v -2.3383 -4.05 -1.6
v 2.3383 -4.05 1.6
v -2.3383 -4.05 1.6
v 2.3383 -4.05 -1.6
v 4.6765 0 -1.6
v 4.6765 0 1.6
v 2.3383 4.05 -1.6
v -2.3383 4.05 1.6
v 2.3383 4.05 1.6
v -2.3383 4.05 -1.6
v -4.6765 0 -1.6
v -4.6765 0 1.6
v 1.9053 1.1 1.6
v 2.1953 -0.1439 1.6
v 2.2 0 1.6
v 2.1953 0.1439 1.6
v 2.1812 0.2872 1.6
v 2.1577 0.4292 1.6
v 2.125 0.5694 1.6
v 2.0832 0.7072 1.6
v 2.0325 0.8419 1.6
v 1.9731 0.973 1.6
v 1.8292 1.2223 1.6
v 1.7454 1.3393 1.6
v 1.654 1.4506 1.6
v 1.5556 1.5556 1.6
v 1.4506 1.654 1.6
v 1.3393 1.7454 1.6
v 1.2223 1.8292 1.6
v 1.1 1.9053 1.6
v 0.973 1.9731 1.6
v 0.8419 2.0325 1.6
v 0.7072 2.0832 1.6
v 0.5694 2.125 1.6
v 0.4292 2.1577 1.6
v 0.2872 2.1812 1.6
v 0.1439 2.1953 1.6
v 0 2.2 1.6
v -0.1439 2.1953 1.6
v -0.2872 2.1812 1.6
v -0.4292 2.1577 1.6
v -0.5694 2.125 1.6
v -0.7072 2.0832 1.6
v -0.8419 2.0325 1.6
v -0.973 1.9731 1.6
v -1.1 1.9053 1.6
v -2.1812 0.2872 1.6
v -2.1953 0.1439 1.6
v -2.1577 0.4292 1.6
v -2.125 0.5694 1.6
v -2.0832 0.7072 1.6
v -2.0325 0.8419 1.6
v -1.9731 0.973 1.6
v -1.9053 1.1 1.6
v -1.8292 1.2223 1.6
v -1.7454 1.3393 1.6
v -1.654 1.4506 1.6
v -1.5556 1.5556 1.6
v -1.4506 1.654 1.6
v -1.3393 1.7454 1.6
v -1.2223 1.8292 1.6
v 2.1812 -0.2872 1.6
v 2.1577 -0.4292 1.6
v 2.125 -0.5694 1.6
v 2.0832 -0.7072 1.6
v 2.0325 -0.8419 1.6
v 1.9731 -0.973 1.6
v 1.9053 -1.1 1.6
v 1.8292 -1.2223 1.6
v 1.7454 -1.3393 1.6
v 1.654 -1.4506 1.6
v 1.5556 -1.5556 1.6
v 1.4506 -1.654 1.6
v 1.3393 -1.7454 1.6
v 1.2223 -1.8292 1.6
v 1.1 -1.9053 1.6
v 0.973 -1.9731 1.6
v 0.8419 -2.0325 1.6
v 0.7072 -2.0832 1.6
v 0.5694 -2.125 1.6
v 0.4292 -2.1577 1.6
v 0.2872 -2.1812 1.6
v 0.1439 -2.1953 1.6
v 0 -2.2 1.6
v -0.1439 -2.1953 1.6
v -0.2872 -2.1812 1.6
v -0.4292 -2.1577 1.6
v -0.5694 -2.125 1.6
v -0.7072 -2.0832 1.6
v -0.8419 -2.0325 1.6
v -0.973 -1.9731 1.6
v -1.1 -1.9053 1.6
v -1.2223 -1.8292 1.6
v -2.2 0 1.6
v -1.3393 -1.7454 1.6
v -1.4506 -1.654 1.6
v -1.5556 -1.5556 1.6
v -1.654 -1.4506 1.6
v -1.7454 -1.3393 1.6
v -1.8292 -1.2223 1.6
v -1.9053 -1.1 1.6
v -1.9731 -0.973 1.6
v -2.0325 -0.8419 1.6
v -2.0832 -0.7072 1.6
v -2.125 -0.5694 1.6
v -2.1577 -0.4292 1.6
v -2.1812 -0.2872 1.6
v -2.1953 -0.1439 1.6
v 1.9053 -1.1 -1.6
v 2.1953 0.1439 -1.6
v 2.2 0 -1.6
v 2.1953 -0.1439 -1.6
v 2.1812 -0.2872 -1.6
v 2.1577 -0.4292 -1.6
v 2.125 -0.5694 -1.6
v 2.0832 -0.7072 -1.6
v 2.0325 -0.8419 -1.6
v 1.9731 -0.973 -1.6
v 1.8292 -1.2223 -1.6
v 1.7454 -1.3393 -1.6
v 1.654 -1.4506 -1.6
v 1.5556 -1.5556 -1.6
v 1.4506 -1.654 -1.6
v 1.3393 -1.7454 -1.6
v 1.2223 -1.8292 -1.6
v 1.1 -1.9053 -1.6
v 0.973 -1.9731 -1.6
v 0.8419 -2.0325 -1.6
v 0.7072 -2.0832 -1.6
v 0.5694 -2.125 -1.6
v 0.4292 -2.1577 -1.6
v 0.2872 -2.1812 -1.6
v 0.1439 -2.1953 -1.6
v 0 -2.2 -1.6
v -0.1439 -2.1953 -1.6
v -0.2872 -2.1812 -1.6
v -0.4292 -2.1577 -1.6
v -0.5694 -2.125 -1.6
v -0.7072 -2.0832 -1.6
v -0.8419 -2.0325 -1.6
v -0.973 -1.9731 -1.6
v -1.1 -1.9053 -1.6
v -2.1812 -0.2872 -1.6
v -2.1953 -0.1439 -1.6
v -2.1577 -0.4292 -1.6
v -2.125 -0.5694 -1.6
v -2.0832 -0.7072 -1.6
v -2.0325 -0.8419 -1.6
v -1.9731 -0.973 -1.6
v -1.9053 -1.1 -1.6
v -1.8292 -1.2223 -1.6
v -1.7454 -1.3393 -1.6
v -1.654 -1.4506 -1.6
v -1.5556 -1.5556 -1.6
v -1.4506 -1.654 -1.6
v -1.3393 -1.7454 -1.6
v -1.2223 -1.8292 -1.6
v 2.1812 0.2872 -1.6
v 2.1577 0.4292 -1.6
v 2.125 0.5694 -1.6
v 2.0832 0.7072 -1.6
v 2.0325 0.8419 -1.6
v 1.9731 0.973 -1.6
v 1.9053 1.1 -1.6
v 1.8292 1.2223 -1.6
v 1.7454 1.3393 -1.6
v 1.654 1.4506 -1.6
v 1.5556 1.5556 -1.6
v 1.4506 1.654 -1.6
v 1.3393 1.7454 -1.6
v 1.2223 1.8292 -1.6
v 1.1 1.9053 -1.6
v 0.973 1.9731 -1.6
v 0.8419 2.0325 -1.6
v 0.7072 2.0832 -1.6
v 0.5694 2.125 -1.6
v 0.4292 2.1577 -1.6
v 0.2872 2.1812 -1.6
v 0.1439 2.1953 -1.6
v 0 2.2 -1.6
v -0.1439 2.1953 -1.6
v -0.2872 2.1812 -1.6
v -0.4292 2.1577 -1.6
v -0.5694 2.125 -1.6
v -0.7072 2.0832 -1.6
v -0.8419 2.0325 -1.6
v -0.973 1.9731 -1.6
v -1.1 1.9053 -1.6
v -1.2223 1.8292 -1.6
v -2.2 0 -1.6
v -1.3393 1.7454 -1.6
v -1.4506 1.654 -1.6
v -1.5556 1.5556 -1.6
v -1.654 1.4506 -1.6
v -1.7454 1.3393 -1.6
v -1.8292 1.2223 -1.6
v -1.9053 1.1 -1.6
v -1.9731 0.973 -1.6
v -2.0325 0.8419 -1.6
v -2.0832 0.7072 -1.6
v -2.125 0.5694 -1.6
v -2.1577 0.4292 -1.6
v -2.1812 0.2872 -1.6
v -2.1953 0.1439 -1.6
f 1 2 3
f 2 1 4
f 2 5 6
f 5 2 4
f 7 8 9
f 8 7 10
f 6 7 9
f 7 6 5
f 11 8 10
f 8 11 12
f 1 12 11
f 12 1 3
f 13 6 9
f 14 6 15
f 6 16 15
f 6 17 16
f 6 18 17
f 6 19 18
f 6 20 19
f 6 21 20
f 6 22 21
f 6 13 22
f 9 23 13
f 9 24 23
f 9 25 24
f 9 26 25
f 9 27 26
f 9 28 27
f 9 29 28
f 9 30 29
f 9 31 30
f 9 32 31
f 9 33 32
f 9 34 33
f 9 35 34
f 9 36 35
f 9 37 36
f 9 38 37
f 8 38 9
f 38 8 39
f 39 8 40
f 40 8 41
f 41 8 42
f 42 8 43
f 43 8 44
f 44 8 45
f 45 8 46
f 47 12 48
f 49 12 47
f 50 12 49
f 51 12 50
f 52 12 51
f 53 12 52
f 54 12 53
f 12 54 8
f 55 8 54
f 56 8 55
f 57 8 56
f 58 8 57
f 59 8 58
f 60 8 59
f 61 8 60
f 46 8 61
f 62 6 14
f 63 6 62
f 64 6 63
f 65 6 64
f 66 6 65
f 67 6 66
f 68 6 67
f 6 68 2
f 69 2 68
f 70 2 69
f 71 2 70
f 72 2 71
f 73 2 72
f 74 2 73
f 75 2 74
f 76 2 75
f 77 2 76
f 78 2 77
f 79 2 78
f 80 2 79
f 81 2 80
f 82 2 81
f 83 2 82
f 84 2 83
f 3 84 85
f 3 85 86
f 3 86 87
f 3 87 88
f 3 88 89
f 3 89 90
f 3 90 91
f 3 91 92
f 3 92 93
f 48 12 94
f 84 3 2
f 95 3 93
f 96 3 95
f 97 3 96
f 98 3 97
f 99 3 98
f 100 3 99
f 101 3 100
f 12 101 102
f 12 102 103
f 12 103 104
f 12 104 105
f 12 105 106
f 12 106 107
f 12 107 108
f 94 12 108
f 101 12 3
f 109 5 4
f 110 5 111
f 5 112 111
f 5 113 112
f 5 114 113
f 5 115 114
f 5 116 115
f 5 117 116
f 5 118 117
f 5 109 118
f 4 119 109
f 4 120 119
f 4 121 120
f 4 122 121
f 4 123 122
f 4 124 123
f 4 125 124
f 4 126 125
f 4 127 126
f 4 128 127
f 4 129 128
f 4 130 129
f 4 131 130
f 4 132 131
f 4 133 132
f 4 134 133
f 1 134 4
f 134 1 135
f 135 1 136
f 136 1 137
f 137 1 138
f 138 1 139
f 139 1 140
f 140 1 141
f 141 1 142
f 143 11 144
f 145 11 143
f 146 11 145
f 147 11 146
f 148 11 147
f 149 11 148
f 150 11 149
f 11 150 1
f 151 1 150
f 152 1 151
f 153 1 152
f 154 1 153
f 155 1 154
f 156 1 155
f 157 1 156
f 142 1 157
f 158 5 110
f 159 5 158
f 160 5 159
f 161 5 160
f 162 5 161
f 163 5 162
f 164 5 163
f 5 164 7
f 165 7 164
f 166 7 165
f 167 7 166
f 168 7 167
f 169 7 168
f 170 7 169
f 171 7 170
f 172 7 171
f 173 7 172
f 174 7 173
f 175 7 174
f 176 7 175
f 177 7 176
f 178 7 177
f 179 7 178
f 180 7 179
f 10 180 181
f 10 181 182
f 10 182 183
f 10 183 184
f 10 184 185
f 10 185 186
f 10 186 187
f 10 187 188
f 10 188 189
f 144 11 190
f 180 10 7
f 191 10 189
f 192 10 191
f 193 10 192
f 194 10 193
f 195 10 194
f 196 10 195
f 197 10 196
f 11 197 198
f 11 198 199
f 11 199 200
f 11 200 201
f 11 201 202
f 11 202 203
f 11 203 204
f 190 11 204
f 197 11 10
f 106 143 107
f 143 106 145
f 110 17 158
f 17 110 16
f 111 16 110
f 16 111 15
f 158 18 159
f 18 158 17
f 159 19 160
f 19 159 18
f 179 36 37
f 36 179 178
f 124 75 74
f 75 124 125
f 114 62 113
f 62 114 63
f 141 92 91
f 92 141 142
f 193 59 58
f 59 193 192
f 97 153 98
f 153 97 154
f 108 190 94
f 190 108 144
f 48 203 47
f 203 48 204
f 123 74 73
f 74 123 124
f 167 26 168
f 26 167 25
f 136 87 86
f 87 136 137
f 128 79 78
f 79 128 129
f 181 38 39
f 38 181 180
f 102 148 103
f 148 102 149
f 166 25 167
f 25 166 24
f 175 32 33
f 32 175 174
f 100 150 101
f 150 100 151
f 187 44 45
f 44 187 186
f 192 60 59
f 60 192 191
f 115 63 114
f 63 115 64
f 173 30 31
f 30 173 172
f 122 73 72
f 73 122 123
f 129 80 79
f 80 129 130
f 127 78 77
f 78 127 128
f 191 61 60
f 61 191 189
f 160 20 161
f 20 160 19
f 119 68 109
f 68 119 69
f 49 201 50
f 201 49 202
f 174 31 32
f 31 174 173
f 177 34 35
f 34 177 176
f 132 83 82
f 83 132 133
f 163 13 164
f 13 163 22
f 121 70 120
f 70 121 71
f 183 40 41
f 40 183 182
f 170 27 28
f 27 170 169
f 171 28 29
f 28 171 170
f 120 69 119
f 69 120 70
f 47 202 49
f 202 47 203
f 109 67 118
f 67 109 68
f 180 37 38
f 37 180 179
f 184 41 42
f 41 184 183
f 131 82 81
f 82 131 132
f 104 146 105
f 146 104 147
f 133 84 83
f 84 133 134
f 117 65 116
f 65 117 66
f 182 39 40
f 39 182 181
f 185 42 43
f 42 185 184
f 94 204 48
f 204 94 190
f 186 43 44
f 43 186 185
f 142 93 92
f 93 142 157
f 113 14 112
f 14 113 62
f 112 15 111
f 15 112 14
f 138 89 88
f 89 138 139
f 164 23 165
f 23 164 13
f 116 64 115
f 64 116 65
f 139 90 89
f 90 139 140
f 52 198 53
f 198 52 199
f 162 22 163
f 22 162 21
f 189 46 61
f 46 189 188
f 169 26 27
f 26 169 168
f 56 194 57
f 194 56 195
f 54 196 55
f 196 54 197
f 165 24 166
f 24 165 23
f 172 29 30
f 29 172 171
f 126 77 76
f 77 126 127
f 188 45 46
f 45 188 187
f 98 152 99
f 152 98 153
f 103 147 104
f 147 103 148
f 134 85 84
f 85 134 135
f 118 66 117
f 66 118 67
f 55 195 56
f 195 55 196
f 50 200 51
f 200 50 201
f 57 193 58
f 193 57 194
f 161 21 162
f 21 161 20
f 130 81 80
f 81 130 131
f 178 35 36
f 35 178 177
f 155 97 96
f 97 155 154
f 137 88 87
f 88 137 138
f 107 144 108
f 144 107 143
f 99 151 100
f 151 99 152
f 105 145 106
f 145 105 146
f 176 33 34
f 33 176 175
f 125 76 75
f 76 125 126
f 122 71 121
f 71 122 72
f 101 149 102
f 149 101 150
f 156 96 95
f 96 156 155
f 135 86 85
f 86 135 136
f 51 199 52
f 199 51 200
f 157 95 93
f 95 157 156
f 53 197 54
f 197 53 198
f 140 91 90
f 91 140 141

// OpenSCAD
// Hex nut for 4.0mm screws, 8.1mm across flats, 3.2mm thick
thread_diameter = 4.0;          // mm
across_flats    = 8.1;          // mm
thickness       = 3.2;          // mm

// Printing/fit controls
hole_clearance  = 0.4;          // mm added to diameter (clearance hole)
eps             = 0.02;         // small overlap for robust boolean ops

// Optional washer (kept disabled to ensure single connected solid by default)
washer_enabled        = 0;      // 0/1
washer_outer_diameter = 9.0;    // mm
washer_thickness      = 0.8;    // mm
washer_overlap        = 0.6;    // mm overlap into nut to guarantee connection if enabled

$fn = 96;

// Derived
hex_R = across_flats / (2 * cos(30));                 // circumradius for $fn=6 cylinder
hole_d = thread_diameter + hole_clearance;            // clearance hole diameter
hole_r = hole_d / 2;

module hex_nut_body() {
    difference() {
        // Hex prism
        cylinder(r = hex_R, h = thickness, center = true, $fn = 6);

        // Through-hole (extend beyond thickness to ensure clean cut)
        cylinder(r = hole_r, h = thickness + 2*eps, center = true, $fn = 96);
    }
}

module washer_body() {
    difference() {
        cylinder(r = washer_outer_diameter/2, h = washer_thickness, center = true, $fn = 128);
        cylinder(r = hole_r, h = washer_thickness + 2*eps, center = true, $fn = 96);
    }
}

module assembly() {
    if (washer_enabled) {
        union() {
            hex_nut_body();
            // Place washer directly under nut with calculated overlap to ensure connectivity
            translate([0, 0, -(thickness/2 + washer_thickness/2 - washer_overlap)])
                washer_body();
        }
    } else {
        hex_nut_body();
    }
}

assembly();
